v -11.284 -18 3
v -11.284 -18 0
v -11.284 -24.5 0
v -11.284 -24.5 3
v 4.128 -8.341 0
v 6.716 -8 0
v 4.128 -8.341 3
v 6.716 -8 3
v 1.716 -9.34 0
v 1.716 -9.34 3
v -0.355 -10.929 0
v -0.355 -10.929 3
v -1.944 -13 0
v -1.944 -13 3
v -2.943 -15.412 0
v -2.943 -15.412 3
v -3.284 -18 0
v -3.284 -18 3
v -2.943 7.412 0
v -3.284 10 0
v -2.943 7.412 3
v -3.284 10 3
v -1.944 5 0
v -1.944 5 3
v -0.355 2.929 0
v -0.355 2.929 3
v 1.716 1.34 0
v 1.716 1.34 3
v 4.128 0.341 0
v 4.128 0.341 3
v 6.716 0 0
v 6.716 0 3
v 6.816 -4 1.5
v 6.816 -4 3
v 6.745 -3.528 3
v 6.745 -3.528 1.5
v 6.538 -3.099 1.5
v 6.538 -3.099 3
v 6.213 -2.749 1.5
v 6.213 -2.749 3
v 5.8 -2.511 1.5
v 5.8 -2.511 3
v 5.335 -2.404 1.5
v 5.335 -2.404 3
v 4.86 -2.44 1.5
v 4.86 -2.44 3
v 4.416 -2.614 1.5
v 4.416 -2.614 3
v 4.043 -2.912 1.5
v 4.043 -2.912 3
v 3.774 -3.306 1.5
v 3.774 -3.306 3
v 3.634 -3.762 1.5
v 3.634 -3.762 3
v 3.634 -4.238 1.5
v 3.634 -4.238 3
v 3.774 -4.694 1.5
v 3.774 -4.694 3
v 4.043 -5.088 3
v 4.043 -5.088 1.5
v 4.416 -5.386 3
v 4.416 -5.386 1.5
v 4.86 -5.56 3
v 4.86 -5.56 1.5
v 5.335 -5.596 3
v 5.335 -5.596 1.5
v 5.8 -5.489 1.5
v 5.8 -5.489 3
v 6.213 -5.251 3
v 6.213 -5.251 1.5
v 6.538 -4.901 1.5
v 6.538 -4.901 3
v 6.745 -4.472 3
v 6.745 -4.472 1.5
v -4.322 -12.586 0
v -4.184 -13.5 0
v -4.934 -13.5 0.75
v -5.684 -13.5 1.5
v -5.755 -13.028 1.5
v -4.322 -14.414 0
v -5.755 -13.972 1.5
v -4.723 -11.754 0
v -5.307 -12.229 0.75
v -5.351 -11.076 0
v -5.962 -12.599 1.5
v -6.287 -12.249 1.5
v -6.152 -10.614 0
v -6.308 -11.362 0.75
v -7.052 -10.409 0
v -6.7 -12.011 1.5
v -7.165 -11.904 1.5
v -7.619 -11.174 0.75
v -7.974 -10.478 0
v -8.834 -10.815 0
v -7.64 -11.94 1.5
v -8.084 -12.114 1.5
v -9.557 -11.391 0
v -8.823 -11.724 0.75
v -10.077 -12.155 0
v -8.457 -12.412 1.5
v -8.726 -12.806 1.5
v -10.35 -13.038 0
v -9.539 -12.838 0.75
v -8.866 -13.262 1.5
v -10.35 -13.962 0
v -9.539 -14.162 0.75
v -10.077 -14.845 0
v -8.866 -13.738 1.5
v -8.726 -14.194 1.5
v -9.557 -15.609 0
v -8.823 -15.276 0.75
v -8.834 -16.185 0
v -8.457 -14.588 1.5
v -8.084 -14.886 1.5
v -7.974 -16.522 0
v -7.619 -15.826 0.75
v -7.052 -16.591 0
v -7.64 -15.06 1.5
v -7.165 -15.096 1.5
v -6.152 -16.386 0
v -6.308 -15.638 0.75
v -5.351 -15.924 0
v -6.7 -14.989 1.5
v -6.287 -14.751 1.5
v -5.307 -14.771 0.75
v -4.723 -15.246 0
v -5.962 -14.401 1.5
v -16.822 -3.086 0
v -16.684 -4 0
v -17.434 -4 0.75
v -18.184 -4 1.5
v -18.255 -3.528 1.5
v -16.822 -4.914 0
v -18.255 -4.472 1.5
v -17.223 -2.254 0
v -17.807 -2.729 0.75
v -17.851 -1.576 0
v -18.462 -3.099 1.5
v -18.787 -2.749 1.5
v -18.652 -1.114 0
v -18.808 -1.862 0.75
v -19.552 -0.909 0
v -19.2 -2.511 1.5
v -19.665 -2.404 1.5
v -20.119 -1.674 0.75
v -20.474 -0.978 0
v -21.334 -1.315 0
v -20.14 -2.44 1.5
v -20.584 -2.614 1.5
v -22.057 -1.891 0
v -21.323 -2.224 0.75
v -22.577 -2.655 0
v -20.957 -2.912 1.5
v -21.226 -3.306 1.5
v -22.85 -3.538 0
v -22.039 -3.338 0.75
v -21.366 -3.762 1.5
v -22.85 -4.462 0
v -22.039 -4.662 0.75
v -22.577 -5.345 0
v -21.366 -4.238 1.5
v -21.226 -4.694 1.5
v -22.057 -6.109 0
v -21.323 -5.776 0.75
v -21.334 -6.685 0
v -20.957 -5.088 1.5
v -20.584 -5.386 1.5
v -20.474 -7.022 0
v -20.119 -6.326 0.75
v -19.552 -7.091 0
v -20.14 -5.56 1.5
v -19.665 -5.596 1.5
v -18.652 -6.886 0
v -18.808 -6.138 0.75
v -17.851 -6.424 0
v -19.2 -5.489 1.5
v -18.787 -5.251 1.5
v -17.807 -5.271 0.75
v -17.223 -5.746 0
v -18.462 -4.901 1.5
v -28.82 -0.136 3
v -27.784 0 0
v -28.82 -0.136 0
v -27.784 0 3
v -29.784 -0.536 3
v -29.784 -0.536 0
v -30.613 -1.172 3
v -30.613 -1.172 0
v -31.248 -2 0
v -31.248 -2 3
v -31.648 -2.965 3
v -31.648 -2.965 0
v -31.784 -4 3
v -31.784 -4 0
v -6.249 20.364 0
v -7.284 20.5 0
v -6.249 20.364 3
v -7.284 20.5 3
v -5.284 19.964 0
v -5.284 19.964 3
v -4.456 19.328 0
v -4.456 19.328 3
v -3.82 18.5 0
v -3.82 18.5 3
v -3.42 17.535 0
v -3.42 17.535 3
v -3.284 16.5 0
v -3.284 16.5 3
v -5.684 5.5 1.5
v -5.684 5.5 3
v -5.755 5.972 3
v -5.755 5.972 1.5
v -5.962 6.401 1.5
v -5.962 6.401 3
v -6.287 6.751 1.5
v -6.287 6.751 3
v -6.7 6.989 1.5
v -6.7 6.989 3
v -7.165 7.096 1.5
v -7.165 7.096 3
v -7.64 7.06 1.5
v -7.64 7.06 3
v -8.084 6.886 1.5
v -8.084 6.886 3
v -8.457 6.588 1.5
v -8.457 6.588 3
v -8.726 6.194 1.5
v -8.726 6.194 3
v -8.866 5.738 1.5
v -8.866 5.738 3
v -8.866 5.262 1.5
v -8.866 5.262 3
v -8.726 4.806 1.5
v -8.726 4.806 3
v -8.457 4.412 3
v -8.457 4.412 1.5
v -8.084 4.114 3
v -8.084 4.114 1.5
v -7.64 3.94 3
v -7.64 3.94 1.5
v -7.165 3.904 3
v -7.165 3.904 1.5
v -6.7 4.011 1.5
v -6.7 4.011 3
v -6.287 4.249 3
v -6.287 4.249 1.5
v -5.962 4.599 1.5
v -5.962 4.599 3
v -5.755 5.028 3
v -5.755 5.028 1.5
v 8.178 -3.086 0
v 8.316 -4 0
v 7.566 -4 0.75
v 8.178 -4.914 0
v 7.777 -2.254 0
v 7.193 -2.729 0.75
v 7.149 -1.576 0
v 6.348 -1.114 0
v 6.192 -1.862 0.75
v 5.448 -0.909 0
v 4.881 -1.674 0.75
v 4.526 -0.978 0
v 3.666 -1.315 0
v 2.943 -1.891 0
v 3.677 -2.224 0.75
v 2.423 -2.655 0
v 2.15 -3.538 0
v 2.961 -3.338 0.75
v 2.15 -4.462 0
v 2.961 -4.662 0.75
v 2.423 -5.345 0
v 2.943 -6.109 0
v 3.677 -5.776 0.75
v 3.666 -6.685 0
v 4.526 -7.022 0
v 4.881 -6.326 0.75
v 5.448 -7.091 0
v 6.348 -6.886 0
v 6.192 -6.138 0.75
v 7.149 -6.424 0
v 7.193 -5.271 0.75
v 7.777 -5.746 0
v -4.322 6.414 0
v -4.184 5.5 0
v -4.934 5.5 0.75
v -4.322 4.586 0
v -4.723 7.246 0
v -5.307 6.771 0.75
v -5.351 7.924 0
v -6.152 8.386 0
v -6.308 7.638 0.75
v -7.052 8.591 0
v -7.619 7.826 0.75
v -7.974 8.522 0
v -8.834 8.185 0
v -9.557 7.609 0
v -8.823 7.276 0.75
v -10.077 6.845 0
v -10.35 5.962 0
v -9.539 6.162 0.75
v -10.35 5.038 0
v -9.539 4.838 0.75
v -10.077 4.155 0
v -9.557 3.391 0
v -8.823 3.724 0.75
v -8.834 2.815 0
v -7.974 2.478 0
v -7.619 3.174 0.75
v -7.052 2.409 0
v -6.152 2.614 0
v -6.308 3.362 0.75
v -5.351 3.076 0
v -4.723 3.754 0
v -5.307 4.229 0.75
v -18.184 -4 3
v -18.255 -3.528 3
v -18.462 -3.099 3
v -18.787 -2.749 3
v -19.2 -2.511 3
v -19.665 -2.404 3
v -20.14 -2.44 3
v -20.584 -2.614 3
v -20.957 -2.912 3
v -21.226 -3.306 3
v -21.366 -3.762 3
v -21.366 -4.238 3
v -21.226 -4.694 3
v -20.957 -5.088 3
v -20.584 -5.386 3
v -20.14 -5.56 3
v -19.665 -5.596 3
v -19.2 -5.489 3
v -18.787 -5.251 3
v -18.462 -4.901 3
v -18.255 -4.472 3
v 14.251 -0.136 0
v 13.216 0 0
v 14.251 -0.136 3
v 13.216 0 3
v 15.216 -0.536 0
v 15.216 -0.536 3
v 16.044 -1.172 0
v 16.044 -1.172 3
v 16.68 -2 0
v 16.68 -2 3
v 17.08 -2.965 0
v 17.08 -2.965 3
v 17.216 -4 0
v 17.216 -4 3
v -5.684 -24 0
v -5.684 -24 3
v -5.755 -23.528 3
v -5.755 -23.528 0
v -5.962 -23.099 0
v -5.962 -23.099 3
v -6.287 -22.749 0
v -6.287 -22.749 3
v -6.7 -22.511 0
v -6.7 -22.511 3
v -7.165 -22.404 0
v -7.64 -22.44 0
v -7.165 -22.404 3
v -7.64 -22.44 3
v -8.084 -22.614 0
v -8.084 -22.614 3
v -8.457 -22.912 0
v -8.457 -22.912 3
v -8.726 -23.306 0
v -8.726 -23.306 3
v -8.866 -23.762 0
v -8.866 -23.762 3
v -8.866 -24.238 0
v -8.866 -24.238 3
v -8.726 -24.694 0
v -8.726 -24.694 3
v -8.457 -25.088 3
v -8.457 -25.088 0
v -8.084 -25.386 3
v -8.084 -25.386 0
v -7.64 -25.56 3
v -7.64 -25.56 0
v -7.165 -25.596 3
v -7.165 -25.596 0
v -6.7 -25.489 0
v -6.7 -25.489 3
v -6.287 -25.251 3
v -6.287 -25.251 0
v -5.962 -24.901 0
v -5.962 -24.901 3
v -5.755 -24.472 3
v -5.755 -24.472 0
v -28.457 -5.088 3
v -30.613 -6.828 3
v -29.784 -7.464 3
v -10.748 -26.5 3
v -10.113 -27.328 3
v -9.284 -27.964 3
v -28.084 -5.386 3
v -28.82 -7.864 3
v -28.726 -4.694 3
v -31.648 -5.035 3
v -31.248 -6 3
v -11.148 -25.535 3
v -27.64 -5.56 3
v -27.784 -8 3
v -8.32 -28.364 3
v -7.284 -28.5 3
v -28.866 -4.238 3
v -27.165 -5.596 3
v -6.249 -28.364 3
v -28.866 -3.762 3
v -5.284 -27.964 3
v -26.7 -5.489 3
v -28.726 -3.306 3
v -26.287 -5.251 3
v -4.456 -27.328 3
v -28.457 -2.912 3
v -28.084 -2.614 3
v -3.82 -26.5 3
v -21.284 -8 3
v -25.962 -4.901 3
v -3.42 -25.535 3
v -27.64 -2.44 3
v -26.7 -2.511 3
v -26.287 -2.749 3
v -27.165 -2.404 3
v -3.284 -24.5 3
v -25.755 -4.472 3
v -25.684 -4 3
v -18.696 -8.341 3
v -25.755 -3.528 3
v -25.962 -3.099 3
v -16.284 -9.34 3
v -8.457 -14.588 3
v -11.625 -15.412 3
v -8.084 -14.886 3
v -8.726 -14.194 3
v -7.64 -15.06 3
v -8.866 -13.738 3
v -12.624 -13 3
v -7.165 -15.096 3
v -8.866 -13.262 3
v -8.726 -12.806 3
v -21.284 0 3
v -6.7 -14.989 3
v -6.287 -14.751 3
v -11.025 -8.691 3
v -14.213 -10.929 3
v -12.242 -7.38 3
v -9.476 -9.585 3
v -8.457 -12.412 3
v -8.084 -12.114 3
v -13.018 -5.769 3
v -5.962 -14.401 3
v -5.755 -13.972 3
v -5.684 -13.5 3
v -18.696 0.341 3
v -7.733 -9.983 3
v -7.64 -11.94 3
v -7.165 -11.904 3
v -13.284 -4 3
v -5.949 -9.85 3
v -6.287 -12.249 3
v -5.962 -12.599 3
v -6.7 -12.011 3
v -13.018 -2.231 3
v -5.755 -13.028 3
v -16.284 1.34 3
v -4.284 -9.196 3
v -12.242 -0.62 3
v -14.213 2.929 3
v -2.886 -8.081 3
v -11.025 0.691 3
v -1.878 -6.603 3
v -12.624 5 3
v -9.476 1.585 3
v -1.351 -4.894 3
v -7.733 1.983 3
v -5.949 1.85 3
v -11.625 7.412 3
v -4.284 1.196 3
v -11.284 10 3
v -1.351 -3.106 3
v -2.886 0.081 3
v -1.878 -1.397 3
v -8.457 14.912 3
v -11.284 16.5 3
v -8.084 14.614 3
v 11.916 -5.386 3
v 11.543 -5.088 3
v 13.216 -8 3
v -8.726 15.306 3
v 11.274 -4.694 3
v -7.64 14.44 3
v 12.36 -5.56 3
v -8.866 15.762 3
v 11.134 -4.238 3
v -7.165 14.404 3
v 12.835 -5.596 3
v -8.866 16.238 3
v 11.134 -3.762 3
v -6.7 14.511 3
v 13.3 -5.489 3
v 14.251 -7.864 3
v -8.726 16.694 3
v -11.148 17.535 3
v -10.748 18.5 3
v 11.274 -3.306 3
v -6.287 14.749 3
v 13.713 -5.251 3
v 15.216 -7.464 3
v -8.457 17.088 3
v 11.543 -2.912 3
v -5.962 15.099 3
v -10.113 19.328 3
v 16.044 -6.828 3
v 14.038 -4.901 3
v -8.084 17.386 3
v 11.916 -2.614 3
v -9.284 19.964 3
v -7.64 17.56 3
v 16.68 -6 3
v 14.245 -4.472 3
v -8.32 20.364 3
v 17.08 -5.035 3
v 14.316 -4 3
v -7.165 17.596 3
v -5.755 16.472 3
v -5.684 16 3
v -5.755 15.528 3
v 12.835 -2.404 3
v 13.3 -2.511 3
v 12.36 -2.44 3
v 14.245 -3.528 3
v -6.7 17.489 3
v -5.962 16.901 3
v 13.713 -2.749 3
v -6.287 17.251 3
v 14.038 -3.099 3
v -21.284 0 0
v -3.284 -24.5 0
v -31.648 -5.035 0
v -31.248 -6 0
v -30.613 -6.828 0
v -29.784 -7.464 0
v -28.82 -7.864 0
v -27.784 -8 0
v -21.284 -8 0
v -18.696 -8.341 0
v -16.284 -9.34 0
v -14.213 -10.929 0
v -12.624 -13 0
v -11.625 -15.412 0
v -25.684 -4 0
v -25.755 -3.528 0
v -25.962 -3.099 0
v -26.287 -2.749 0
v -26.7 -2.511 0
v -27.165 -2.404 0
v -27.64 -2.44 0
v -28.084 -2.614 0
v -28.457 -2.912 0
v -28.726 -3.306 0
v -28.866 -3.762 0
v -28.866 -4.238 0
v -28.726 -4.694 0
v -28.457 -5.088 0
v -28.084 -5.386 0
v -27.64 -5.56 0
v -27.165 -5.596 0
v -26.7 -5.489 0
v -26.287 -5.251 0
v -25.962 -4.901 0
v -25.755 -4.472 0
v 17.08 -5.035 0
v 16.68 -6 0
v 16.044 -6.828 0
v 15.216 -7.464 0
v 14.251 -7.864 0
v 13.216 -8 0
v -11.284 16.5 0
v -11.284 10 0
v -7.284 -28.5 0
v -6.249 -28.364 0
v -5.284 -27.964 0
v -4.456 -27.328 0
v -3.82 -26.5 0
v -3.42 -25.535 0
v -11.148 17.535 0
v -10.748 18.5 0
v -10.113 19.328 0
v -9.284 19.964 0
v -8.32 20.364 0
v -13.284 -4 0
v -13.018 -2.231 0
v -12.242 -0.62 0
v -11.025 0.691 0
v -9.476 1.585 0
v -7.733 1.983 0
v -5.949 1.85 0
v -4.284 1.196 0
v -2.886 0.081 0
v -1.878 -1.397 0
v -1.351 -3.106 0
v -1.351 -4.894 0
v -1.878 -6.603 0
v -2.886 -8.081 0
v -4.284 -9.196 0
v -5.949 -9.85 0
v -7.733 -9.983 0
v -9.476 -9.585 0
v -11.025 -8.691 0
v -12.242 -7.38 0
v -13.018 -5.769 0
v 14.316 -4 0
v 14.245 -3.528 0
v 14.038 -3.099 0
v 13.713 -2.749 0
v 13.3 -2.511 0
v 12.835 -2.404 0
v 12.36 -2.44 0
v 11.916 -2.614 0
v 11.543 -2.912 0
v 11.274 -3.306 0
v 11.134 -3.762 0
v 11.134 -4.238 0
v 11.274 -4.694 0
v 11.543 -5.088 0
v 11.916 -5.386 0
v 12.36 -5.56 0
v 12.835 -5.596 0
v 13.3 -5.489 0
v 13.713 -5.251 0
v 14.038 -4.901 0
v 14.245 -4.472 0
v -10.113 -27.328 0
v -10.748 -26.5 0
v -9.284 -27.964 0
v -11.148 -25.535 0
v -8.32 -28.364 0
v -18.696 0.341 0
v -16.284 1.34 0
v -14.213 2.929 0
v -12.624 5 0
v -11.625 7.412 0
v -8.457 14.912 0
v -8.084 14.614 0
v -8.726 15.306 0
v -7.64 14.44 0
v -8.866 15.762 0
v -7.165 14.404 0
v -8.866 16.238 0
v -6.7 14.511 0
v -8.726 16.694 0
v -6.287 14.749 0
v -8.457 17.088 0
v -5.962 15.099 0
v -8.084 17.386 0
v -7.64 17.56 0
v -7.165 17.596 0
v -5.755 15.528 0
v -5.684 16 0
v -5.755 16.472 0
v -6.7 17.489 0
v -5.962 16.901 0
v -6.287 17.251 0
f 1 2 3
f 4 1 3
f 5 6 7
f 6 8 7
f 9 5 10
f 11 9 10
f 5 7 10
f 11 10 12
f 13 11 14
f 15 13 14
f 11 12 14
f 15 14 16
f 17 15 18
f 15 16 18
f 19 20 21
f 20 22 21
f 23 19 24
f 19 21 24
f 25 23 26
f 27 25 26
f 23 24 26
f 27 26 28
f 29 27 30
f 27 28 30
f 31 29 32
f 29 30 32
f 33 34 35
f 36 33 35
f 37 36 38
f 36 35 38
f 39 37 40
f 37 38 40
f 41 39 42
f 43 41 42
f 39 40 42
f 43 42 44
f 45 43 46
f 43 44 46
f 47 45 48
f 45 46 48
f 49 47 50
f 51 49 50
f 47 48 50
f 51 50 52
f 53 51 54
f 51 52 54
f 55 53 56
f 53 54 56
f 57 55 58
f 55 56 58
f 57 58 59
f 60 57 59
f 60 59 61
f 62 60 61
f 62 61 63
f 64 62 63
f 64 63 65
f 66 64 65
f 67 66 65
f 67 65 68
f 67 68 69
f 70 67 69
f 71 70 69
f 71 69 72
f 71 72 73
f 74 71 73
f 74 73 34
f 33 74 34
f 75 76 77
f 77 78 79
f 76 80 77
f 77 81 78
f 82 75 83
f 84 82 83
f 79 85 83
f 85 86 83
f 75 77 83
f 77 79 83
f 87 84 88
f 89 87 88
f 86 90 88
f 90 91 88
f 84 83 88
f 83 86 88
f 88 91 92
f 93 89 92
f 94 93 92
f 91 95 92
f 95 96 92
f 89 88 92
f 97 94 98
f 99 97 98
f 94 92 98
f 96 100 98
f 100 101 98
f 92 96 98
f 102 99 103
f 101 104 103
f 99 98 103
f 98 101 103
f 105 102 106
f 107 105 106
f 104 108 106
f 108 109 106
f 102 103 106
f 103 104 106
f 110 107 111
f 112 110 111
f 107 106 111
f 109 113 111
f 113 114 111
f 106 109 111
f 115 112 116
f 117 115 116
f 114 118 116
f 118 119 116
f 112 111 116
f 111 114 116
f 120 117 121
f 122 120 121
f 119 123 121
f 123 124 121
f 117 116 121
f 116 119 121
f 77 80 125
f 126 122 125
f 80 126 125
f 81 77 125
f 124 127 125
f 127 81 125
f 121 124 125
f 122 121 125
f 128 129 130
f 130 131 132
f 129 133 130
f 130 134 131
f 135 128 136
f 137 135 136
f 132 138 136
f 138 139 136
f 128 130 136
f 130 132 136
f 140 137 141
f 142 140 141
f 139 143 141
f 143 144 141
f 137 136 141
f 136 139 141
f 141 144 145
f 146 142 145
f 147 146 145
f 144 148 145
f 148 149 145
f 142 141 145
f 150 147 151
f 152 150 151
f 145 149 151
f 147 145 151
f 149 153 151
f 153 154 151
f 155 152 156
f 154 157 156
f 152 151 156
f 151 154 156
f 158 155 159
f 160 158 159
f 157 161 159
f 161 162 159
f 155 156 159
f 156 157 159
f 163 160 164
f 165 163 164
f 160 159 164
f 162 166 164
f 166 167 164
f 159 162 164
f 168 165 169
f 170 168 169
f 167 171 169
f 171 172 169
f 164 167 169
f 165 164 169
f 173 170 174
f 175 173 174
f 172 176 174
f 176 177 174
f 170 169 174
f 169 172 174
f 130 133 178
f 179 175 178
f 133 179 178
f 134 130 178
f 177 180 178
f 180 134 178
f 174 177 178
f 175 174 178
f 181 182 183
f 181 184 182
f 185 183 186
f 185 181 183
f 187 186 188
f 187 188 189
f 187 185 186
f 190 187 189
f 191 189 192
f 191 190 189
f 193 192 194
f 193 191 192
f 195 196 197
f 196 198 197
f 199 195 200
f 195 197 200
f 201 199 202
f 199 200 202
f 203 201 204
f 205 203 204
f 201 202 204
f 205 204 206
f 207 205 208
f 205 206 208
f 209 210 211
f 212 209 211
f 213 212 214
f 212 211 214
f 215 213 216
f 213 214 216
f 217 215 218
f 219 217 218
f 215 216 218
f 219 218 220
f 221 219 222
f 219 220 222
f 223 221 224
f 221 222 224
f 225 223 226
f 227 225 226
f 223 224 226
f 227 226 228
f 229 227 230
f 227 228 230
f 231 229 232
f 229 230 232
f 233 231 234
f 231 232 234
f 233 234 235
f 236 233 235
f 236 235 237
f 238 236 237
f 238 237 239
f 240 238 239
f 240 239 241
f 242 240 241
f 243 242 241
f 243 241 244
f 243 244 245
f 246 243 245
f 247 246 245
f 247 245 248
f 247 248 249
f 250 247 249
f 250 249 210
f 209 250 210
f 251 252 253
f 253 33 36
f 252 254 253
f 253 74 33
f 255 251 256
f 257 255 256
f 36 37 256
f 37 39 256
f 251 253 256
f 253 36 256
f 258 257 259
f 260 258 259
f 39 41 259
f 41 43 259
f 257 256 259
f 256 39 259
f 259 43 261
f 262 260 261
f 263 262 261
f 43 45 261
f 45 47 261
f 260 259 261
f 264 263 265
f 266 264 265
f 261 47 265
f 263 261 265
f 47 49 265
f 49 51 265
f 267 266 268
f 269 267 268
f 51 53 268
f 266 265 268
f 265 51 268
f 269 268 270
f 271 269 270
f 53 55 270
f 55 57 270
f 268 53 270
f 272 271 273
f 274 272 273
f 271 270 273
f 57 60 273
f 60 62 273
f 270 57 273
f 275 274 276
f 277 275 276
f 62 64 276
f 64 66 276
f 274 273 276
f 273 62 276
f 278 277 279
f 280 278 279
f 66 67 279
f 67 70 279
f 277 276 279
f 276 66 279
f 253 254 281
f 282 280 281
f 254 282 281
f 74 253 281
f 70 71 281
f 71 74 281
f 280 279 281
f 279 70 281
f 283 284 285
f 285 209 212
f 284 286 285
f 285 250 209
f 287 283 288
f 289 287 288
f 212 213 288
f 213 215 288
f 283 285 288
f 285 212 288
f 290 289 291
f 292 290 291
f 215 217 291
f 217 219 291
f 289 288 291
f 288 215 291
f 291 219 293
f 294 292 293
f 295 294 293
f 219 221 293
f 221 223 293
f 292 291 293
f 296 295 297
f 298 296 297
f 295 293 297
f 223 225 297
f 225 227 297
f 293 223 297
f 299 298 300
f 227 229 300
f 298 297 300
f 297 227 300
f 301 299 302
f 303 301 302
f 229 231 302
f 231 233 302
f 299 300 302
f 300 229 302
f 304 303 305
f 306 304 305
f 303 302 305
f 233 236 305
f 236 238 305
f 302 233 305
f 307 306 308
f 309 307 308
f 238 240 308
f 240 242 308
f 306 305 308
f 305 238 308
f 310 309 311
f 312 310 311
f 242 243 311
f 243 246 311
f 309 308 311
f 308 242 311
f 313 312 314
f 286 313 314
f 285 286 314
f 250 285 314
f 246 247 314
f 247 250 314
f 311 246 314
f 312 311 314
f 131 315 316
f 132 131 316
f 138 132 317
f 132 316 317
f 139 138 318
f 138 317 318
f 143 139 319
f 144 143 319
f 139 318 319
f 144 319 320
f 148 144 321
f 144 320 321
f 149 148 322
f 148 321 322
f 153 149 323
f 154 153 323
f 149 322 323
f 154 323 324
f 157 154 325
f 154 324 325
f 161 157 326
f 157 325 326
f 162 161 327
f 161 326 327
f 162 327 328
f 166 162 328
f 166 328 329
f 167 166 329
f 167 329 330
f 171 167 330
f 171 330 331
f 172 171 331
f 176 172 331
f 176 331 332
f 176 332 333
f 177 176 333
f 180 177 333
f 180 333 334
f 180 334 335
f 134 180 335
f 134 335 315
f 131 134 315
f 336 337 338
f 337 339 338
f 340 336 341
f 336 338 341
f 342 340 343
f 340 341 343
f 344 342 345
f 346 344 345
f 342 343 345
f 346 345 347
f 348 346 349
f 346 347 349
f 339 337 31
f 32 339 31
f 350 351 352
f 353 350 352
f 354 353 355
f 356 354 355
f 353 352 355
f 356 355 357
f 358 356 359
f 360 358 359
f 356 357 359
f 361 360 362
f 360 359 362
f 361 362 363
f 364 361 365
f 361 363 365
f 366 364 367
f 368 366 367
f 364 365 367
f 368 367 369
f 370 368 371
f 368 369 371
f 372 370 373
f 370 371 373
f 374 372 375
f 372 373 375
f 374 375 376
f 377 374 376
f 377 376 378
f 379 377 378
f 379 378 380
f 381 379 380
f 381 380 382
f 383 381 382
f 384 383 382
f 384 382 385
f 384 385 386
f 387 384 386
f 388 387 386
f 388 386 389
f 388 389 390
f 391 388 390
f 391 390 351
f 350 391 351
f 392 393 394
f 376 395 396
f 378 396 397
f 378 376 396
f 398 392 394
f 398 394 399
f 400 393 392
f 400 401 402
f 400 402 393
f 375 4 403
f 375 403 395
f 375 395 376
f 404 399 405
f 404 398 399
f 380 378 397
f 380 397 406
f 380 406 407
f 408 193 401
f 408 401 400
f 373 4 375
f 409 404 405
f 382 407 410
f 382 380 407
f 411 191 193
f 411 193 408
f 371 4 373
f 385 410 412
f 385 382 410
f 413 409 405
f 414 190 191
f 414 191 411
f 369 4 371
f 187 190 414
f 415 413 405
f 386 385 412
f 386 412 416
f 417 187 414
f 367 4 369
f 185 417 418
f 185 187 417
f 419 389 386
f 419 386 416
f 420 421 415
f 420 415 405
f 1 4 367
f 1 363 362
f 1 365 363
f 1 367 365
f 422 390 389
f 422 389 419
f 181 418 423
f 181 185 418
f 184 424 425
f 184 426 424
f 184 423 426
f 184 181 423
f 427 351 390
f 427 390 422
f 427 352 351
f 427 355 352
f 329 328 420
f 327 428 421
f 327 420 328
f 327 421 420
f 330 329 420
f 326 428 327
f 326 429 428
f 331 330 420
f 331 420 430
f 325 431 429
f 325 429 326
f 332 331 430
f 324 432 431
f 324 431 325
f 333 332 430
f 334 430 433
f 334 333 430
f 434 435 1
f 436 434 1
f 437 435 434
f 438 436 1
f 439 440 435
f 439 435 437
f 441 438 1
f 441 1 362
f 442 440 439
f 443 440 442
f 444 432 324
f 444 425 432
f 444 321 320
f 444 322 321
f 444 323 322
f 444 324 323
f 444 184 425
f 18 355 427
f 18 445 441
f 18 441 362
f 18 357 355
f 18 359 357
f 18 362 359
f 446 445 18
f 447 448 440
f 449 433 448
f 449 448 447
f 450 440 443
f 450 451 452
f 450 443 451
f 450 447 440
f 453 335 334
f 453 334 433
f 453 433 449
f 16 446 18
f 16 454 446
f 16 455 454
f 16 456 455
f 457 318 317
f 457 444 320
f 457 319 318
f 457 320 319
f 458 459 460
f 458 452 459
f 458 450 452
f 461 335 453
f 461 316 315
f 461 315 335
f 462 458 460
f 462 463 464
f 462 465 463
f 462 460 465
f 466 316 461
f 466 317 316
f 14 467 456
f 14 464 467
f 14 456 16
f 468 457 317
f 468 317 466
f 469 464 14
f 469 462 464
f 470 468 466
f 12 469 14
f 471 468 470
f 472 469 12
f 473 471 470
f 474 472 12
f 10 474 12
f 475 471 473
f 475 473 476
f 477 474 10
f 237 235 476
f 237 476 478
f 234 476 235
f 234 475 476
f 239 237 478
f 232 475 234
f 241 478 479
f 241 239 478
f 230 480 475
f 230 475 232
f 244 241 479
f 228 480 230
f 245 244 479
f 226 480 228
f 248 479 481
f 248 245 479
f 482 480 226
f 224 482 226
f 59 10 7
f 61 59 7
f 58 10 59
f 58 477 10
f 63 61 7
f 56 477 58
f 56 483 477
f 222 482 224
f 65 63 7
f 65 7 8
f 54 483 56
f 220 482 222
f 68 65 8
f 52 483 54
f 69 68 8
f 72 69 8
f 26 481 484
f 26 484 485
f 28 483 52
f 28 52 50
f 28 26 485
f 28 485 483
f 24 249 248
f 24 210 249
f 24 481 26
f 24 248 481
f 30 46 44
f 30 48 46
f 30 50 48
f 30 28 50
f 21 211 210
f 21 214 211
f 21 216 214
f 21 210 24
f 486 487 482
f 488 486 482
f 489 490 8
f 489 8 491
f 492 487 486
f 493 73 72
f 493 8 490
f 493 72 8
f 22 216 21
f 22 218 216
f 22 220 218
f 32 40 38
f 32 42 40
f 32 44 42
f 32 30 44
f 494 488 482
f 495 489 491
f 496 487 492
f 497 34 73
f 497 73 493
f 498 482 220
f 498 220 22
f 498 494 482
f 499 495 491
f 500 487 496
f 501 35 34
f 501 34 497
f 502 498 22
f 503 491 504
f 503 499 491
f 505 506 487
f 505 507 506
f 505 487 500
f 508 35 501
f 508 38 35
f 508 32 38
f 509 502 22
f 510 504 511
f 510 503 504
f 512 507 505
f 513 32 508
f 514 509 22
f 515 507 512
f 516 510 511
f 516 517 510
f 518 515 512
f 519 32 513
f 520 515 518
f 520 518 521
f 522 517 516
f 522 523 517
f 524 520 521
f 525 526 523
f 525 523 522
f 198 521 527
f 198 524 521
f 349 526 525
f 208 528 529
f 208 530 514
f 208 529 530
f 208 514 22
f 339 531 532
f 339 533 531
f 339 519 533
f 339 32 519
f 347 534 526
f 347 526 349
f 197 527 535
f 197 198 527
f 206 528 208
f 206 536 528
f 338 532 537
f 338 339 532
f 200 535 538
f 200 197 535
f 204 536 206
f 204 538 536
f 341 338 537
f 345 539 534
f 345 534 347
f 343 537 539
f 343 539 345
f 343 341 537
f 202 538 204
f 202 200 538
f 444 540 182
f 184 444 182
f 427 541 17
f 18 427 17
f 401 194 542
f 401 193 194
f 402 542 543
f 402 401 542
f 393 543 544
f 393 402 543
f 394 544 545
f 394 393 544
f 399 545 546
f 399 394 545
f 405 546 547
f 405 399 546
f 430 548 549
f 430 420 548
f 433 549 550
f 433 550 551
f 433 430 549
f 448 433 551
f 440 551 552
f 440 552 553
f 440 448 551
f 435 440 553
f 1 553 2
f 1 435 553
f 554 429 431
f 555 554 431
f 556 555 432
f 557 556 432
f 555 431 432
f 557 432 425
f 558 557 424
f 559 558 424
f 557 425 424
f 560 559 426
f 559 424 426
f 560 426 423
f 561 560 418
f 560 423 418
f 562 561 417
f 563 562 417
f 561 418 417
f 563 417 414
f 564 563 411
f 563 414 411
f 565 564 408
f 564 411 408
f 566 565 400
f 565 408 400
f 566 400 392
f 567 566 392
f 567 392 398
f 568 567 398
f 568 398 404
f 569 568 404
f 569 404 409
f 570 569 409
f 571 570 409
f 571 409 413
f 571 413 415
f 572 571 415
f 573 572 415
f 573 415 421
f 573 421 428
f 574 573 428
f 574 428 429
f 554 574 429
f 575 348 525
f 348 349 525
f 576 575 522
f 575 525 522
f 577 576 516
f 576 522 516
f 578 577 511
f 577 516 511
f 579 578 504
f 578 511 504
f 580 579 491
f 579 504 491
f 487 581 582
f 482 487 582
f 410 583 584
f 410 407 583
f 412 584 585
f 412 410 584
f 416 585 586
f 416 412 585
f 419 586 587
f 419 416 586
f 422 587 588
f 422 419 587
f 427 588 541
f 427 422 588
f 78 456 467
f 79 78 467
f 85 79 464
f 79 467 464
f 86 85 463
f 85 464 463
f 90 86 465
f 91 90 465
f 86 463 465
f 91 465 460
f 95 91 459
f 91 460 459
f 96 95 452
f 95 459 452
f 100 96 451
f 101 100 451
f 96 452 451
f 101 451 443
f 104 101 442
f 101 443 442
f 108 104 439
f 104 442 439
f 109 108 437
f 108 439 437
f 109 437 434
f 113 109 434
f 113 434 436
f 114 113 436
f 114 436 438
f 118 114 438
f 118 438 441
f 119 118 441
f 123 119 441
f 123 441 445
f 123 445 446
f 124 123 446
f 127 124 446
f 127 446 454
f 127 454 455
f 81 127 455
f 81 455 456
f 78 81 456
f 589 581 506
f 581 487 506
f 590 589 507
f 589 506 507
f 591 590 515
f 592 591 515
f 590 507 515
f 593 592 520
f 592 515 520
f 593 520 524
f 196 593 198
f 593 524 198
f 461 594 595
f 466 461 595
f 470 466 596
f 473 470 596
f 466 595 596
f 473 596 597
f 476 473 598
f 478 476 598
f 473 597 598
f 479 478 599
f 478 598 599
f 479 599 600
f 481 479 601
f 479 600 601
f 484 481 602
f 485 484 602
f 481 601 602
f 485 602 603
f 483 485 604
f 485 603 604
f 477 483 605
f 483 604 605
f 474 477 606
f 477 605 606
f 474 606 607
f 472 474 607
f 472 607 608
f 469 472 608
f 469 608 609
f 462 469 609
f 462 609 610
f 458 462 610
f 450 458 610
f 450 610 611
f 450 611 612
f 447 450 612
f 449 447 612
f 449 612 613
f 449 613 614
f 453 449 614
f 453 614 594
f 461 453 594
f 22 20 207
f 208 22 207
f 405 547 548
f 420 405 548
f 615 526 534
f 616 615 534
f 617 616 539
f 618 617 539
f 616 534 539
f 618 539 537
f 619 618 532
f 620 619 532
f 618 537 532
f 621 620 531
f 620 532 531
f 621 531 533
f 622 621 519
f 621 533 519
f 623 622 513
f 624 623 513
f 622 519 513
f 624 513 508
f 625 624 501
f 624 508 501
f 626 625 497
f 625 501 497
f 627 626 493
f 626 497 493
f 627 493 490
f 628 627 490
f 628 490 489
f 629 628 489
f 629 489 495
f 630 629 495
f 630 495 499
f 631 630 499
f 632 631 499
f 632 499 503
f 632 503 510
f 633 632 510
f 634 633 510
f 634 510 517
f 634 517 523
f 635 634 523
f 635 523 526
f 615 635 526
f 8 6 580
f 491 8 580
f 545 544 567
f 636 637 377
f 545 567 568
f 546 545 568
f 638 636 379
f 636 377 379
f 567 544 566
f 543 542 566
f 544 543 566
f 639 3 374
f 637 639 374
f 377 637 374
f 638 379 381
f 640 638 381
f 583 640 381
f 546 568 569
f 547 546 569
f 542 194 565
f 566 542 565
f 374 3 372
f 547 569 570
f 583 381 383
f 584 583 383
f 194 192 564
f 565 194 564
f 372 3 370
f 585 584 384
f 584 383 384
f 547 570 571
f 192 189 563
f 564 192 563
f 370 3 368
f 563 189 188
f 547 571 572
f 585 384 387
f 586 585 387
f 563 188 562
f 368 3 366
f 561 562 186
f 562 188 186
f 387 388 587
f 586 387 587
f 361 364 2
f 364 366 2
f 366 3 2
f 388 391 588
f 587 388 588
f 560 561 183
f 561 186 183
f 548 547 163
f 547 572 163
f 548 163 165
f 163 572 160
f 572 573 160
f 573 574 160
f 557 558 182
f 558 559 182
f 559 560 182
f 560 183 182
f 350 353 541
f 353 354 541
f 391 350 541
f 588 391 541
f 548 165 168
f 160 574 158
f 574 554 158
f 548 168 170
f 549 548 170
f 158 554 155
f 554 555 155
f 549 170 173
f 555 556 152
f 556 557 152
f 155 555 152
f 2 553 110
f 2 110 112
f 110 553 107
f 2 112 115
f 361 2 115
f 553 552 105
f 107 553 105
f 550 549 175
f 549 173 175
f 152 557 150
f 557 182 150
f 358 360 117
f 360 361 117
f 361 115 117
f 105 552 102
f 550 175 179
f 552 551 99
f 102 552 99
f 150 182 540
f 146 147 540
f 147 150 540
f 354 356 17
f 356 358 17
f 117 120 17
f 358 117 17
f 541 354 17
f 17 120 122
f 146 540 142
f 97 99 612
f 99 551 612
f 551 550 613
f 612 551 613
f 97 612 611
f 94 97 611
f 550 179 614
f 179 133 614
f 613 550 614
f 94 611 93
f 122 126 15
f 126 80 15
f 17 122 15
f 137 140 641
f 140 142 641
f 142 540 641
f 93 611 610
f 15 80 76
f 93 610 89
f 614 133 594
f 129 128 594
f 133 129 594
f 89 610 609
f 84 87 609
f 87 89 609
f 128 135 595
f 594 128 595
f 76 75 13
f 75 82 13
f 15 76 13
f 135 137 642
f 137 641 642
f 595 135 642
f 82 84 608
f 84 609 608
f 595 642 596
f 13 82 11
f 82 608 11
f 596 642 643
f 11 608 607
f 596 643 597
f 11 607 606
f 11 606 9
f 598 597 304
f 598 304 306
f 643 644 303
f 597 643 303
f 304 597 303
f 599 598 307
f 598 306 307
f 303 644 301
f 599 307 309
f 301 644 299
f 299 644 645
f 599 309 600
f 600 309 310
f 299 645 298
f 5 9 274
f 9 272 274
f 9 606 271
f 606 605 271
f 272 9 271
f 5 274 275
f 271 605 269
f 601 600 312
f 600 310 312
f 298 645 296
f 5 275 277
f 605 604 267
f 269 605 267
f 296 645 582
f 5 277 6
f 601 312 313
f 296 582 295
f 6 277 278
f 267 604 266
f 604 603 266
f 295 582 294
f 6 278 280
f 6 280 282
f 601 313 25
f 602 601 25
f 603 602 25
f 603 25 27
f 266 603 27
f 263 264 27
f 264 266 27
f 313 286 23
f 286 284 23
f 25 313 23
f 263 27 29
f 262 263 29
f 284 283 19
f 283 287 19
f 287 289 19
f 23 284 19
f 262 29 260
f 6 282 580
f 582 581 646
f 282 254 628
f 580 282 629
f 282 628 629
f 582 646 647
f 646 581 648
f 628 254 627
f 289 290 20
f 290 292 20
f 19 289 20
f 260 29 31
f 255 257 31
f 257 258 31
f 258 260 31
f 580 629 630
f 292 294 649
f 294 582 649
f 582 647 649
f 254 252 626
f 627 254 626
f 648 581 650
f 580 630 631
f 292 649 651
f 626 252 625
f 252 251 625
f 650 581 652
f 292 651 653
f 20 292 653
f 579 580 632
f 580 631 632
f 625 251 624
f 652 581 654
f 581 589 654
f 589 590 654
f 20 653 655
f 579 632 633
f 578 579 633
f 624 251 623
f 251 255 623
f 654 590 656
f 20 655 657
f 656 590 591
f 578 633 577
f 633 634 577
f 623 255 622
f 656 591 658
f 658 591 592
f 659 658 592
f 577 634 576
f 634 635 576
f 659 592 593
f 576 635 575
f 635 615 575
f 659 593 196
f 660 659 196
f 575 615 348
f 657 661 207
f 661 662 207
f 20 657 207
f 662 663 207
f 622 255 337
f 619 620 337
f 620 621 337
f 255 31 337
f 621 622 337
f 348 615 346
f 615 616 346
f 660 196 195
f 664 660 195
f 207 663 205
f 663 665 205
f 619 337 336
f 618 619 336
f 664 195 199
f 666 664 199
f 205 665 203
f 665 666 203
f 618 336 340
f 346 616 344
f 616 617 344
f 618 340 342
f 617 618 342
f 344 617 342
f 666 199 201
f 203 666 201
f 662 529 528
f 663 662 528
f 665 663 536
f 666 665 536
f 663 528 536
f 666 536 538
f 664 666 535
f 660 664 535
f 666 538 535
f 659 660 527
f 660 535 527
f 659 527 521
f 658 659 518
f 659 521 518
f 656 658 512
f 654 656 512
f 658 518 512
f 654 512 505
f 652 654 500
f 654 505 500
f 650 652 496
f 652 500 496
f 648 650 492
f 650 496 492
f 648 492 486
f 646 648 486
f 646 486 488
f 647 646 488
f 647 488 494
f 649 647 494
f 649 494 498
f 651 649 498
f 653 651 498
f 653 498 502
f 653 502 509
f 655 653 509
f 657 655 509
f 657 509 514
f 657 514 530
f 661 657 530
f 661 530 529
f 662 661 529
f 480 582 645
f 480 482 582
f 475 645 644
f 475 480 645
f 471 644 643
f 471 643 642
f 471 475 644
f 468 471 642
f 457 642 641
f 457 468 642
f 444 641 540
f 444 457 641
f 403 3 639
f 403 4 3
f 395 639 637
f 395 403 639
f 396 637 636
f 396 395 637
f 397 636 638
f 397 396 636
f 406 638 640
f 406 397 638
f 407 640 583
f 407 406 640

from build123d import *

# Parameters (mm, degrees)
BOSS_EXTRU_1_DEPTH      = 3
ENL_V_MAT_EXTRU_1_REACH = 44.796
ESQUISSE2_R             = 1.6
CONG_1_R                = 10
CONG_2_R                = 4
ENL_V_MAT_EXTRU_2_REACH = 44.796
ESQUISSE3_R             = 6
CHANFREIN1_SIZE         = 1.5


with BuildPart() as part:
    # Esquisse1 → Boss.-Extru.1 (new body)
    with BuildSketch(Plane.XY):
        Polygon((-11.28415855, 20.5), (-11.28415855, 0), (-31.78415855, 0), (-31.78415855, -8), (-11.28415855, -8), (-11.28415855, -28.5), (-3.28415855, -28.5), (-3.28415855, -8), (17.21584145, -8), (17.21584145, 0), (-3.28415855, 0), (-3.28415855, 20.5), align=None)
    extrude(amount=BOSS_EXTRU_1_DEPTH)

    # Esquisse2 → Enlèv. mat.-Extru.1 (cut, up to next)
    with BuildSketch(Plane.XY.offset(3), mode=Mode.PRIVATE) as enl_v_mat_extru_1_sk1:
        with Locations((-27.28415855, -4)):
            Circle(ESQUISSE2_R)
    enl_v_mat_extru_1_tool1 = extrude(enl_v_mat_extru_1_sk1.sketch, amount=-ENL_V_MAT_EXTRU_1_REACH, mode=Mode.PRIVATE) & part.part
    # Esquisse2 → Enlèv. mat.-Extru.1 (cut, up to next)
    with BuildSketch(Plane.XY.offset(3), mode=Mode.PRIVATE) as enl_v_mat_extru_1_sk2:
        with Locations((-19.78415855, -4)):
            Circle(ESQUISSE2_R)
    enl_v_mat_extru_1_tool2 = extrude(enl_v_mat_extru_1_sk2.sketch, amount=-ENL_V_MAT_EXTRU_1_REACH, mode=Mode.PRIVATE) & part.part
    # Esquisse2 → Enlèv. mat.-Extru.1 (cut, up to next)
    with BuildSketch(Plane.XY.offset(3), mode=Mode.PRIVATE) as enl_v_mat_extru_1_sk3:
        with Locations((-7.28415855, -13.5)):
            Circle(ESQUISSE2_R)
    enl_v_mat_extru_1_tool3 = extrude(enl_v_mat_extru_1_sk3.sketch, amount=-ENL_V_MAT_EXTRU_1_REACH, mode=Mode.PRIVATE) & part.part
    # Esquisse2 → Enlèv. mat.-Extru.1 (cut, up to next)
    with BuildSketch(Plane.XY.offset(3), mode=Mode.PRIVATE) as enl_v_mat_extru_1_sk4:
        with Locations((-7.28415855, 5.5)):
            Circle(ESQUISSE2_R)
    enl_v_mat_extru_1_tool4 = extrude(enl_v_mat_extru_1_sk4.sketch, amount=-ENL_V_MAT_EXTRU_1_REACH, mode=Mode.PRIVATE) & part.part
    # Esquisse2 → Enlèv. mat.-Extru.1 (cut, up to next)
    with BuildSketch(Plane.XY.offset(3), mode=Mode.PRIVATE) as enl_v_mat_extru_1_sk5:
        with Locations((-7.28415855, 16)):
            Circle(ESQUISSE2_R)
    enl_v_mat_extru_1_tool5 = extrude(enl_v_mat_extru_1_sk5.sketch, amount=-ENL_V_MAT_EXTRU_1_REACH, mode=Mode.PRIVATE) & part.part
    # Esquisse2 → Enlèv. mat.-Extru.1 (cut, up to next)
    with BuildSketch(Plane.XY.offset(3), mode=Mode.PRIVATE) as enl_v_mat_extru_1_sk6:
        with Locations((5.21584145, -4)):
            Circle(ESQUISSE2_R)
    enl_v_mat_extru_1_tool6 = extrude(enl_v_mat_extru_1_sk6.sketch, amount=-ENL_V_MAT_EXTRU_1_REACH, mode=Mode.PRIVATE) & part.part
    # Esquisse2 → Enlèv. mat.-Extru.1 (cut, up to next)
    with BuildSketch(Plane.XY.offset(3), mode=Mode.PRIVATE) as enl_v_mat_extru_1_sk7:
        with Locations((12.71584145, -4)):
            Circle(ESQUISSE2_R)
    enl_v_mat_extru_1_tool7 = extrude(enl_v_mat_extru_1_sk7.sketch, amount=-ENL_V_MAT_EXTRU_1_REACH, mode=Mode.PRIVATE) & part.part
    # Esquisse2 → Enlèv. mat.-Extru.1 (cut, up to next)
    with BuildSketch(Plane.XY.offset(3), mode=Mode.PRIVATE) as enl_v_mat_extru_1_sk8:
        with Locations((-7.28415855, -24)):
            Circle(ESQUISSE2_R)
    enl_v_mat_extru_1_tool8 = extrude(enl_v_mat_extru_1_sk8.sketch, amount=-ENL_V_MAT_EXTRU_1_REACH, mode=Mode.PRIVATE) & part.part
    add(enl_v_mat_extru_1_tool1.solids().sort_by_distance((-27.284159, -4, 3))[0], mode=Mode.SUBTRACT)
    add(enl_v_mat_extru_1_tool2.solids().sort_by_distance((-19.784159, -4, 3))[0], mode=Mode.SUBTRACT)
    add(enl_v_mat_extru_1_tool3.solids().sort_by_distance((-7.284159, -13.5, 3))[0], mode=Mode.SUBTRACT)
    add(enl_v_mat_extru_1_tool4.solids().sort_by_distance((-7.284159, 5.5, 3))[0], mode=Mode.SUBTRACT)
    add(enl_v_mat_extru_1_tool5.solids().sort_by_distance((-7.284159, 16, 3))[0], mode=Mode.SUBTRACT)
    add(enl_v_mat_extru_1_tool6.solids().sort_by_distance((5.215841, -4, 3))[0], mode=Mode.SUBTRACT)
    add(enl_v_mat_extru_1_tool7.solids().sort_by_distance((12.715841, -4, 3))[0], mode=Mode.SUBTRACT)
    add(enl_v_mat_extru_1_tool8.solids().sort_by_distance((-7.284159, -24, 3))[0], mode=Mode.SUBTRACT)

    # Congé1
    cong_1_edges = [part.edges().sort_by_distance(p)[0] for p in [
        (-3.28415855, 0, 1.5),
        (-3.28415855, -8, 1.5),
        (-11.28415855, -8, 1.5),
        (-11.28415855, 0, 1.5),
    ]]
    fillet(cong_1_edges, radius=CONG_1_R)

    # Congé2
    cong_2_edges = [part.edges().sort_by_distance(p)[0] for p in [
        (-11.28415855, -28.5, 1.5),
        (-3.28415855, -28.5, 1.5),
        (17.21584145, -8, 1.5),
        (17.21584145, 0, 1.5),
        (-3.28415855, 20.5, 1.5),
        (-11.28415855, 20.5, 1.5),
        (-31.78415855, -8, 1.5),
        (-31.78415855, 0, 1.5),
    ]]
    fillet(cong_2_edges, radius=CONG_2_R - 0.0001)  # a hair under: the kernel refuses the full size

    # Esquisse3 → Enlèv. mat.-Extru.2 (cut, up to next)
    with BuildSketch(Plane(origin=(0, 0, 0), x_dir=(-1, 0, 0), z_dir=(0, 0, -1)), mode=Mode.PRIVATE) as enl_v_mat_extru_2_sk1:
        with Locations((7.28415855, -4)):
            Circle(ESQUISSE3_R)
    enl_v_mat_extru_2_tool1 = extrude(enl_v_mat_extru_2_sk1.sketch, amount=-ENL_V_MAT_EXTRU_2_REACH, mode=Mode.PRIVATE) & part.part
    add(enl_v_mat_extru_2_tool1.solids().sort_by_distance((-7.284159, -4, 0))[0], mode=Mode.SUBTRACT)

    # Chanfrein1
    chanfrein1_edges = [part.edges().sort_by_distance(p)[0] for p in [
        (3.61584145, -4, 0),
        (-8.88415855, 5.5, 0),
        (-8.88415855, -13.5, 0),
        (-21.38415855, -4, 0),
    ]]
    chamfer(chanfrein1_edges, length=CHANFREIN1_SIZE)


solid = part.part
